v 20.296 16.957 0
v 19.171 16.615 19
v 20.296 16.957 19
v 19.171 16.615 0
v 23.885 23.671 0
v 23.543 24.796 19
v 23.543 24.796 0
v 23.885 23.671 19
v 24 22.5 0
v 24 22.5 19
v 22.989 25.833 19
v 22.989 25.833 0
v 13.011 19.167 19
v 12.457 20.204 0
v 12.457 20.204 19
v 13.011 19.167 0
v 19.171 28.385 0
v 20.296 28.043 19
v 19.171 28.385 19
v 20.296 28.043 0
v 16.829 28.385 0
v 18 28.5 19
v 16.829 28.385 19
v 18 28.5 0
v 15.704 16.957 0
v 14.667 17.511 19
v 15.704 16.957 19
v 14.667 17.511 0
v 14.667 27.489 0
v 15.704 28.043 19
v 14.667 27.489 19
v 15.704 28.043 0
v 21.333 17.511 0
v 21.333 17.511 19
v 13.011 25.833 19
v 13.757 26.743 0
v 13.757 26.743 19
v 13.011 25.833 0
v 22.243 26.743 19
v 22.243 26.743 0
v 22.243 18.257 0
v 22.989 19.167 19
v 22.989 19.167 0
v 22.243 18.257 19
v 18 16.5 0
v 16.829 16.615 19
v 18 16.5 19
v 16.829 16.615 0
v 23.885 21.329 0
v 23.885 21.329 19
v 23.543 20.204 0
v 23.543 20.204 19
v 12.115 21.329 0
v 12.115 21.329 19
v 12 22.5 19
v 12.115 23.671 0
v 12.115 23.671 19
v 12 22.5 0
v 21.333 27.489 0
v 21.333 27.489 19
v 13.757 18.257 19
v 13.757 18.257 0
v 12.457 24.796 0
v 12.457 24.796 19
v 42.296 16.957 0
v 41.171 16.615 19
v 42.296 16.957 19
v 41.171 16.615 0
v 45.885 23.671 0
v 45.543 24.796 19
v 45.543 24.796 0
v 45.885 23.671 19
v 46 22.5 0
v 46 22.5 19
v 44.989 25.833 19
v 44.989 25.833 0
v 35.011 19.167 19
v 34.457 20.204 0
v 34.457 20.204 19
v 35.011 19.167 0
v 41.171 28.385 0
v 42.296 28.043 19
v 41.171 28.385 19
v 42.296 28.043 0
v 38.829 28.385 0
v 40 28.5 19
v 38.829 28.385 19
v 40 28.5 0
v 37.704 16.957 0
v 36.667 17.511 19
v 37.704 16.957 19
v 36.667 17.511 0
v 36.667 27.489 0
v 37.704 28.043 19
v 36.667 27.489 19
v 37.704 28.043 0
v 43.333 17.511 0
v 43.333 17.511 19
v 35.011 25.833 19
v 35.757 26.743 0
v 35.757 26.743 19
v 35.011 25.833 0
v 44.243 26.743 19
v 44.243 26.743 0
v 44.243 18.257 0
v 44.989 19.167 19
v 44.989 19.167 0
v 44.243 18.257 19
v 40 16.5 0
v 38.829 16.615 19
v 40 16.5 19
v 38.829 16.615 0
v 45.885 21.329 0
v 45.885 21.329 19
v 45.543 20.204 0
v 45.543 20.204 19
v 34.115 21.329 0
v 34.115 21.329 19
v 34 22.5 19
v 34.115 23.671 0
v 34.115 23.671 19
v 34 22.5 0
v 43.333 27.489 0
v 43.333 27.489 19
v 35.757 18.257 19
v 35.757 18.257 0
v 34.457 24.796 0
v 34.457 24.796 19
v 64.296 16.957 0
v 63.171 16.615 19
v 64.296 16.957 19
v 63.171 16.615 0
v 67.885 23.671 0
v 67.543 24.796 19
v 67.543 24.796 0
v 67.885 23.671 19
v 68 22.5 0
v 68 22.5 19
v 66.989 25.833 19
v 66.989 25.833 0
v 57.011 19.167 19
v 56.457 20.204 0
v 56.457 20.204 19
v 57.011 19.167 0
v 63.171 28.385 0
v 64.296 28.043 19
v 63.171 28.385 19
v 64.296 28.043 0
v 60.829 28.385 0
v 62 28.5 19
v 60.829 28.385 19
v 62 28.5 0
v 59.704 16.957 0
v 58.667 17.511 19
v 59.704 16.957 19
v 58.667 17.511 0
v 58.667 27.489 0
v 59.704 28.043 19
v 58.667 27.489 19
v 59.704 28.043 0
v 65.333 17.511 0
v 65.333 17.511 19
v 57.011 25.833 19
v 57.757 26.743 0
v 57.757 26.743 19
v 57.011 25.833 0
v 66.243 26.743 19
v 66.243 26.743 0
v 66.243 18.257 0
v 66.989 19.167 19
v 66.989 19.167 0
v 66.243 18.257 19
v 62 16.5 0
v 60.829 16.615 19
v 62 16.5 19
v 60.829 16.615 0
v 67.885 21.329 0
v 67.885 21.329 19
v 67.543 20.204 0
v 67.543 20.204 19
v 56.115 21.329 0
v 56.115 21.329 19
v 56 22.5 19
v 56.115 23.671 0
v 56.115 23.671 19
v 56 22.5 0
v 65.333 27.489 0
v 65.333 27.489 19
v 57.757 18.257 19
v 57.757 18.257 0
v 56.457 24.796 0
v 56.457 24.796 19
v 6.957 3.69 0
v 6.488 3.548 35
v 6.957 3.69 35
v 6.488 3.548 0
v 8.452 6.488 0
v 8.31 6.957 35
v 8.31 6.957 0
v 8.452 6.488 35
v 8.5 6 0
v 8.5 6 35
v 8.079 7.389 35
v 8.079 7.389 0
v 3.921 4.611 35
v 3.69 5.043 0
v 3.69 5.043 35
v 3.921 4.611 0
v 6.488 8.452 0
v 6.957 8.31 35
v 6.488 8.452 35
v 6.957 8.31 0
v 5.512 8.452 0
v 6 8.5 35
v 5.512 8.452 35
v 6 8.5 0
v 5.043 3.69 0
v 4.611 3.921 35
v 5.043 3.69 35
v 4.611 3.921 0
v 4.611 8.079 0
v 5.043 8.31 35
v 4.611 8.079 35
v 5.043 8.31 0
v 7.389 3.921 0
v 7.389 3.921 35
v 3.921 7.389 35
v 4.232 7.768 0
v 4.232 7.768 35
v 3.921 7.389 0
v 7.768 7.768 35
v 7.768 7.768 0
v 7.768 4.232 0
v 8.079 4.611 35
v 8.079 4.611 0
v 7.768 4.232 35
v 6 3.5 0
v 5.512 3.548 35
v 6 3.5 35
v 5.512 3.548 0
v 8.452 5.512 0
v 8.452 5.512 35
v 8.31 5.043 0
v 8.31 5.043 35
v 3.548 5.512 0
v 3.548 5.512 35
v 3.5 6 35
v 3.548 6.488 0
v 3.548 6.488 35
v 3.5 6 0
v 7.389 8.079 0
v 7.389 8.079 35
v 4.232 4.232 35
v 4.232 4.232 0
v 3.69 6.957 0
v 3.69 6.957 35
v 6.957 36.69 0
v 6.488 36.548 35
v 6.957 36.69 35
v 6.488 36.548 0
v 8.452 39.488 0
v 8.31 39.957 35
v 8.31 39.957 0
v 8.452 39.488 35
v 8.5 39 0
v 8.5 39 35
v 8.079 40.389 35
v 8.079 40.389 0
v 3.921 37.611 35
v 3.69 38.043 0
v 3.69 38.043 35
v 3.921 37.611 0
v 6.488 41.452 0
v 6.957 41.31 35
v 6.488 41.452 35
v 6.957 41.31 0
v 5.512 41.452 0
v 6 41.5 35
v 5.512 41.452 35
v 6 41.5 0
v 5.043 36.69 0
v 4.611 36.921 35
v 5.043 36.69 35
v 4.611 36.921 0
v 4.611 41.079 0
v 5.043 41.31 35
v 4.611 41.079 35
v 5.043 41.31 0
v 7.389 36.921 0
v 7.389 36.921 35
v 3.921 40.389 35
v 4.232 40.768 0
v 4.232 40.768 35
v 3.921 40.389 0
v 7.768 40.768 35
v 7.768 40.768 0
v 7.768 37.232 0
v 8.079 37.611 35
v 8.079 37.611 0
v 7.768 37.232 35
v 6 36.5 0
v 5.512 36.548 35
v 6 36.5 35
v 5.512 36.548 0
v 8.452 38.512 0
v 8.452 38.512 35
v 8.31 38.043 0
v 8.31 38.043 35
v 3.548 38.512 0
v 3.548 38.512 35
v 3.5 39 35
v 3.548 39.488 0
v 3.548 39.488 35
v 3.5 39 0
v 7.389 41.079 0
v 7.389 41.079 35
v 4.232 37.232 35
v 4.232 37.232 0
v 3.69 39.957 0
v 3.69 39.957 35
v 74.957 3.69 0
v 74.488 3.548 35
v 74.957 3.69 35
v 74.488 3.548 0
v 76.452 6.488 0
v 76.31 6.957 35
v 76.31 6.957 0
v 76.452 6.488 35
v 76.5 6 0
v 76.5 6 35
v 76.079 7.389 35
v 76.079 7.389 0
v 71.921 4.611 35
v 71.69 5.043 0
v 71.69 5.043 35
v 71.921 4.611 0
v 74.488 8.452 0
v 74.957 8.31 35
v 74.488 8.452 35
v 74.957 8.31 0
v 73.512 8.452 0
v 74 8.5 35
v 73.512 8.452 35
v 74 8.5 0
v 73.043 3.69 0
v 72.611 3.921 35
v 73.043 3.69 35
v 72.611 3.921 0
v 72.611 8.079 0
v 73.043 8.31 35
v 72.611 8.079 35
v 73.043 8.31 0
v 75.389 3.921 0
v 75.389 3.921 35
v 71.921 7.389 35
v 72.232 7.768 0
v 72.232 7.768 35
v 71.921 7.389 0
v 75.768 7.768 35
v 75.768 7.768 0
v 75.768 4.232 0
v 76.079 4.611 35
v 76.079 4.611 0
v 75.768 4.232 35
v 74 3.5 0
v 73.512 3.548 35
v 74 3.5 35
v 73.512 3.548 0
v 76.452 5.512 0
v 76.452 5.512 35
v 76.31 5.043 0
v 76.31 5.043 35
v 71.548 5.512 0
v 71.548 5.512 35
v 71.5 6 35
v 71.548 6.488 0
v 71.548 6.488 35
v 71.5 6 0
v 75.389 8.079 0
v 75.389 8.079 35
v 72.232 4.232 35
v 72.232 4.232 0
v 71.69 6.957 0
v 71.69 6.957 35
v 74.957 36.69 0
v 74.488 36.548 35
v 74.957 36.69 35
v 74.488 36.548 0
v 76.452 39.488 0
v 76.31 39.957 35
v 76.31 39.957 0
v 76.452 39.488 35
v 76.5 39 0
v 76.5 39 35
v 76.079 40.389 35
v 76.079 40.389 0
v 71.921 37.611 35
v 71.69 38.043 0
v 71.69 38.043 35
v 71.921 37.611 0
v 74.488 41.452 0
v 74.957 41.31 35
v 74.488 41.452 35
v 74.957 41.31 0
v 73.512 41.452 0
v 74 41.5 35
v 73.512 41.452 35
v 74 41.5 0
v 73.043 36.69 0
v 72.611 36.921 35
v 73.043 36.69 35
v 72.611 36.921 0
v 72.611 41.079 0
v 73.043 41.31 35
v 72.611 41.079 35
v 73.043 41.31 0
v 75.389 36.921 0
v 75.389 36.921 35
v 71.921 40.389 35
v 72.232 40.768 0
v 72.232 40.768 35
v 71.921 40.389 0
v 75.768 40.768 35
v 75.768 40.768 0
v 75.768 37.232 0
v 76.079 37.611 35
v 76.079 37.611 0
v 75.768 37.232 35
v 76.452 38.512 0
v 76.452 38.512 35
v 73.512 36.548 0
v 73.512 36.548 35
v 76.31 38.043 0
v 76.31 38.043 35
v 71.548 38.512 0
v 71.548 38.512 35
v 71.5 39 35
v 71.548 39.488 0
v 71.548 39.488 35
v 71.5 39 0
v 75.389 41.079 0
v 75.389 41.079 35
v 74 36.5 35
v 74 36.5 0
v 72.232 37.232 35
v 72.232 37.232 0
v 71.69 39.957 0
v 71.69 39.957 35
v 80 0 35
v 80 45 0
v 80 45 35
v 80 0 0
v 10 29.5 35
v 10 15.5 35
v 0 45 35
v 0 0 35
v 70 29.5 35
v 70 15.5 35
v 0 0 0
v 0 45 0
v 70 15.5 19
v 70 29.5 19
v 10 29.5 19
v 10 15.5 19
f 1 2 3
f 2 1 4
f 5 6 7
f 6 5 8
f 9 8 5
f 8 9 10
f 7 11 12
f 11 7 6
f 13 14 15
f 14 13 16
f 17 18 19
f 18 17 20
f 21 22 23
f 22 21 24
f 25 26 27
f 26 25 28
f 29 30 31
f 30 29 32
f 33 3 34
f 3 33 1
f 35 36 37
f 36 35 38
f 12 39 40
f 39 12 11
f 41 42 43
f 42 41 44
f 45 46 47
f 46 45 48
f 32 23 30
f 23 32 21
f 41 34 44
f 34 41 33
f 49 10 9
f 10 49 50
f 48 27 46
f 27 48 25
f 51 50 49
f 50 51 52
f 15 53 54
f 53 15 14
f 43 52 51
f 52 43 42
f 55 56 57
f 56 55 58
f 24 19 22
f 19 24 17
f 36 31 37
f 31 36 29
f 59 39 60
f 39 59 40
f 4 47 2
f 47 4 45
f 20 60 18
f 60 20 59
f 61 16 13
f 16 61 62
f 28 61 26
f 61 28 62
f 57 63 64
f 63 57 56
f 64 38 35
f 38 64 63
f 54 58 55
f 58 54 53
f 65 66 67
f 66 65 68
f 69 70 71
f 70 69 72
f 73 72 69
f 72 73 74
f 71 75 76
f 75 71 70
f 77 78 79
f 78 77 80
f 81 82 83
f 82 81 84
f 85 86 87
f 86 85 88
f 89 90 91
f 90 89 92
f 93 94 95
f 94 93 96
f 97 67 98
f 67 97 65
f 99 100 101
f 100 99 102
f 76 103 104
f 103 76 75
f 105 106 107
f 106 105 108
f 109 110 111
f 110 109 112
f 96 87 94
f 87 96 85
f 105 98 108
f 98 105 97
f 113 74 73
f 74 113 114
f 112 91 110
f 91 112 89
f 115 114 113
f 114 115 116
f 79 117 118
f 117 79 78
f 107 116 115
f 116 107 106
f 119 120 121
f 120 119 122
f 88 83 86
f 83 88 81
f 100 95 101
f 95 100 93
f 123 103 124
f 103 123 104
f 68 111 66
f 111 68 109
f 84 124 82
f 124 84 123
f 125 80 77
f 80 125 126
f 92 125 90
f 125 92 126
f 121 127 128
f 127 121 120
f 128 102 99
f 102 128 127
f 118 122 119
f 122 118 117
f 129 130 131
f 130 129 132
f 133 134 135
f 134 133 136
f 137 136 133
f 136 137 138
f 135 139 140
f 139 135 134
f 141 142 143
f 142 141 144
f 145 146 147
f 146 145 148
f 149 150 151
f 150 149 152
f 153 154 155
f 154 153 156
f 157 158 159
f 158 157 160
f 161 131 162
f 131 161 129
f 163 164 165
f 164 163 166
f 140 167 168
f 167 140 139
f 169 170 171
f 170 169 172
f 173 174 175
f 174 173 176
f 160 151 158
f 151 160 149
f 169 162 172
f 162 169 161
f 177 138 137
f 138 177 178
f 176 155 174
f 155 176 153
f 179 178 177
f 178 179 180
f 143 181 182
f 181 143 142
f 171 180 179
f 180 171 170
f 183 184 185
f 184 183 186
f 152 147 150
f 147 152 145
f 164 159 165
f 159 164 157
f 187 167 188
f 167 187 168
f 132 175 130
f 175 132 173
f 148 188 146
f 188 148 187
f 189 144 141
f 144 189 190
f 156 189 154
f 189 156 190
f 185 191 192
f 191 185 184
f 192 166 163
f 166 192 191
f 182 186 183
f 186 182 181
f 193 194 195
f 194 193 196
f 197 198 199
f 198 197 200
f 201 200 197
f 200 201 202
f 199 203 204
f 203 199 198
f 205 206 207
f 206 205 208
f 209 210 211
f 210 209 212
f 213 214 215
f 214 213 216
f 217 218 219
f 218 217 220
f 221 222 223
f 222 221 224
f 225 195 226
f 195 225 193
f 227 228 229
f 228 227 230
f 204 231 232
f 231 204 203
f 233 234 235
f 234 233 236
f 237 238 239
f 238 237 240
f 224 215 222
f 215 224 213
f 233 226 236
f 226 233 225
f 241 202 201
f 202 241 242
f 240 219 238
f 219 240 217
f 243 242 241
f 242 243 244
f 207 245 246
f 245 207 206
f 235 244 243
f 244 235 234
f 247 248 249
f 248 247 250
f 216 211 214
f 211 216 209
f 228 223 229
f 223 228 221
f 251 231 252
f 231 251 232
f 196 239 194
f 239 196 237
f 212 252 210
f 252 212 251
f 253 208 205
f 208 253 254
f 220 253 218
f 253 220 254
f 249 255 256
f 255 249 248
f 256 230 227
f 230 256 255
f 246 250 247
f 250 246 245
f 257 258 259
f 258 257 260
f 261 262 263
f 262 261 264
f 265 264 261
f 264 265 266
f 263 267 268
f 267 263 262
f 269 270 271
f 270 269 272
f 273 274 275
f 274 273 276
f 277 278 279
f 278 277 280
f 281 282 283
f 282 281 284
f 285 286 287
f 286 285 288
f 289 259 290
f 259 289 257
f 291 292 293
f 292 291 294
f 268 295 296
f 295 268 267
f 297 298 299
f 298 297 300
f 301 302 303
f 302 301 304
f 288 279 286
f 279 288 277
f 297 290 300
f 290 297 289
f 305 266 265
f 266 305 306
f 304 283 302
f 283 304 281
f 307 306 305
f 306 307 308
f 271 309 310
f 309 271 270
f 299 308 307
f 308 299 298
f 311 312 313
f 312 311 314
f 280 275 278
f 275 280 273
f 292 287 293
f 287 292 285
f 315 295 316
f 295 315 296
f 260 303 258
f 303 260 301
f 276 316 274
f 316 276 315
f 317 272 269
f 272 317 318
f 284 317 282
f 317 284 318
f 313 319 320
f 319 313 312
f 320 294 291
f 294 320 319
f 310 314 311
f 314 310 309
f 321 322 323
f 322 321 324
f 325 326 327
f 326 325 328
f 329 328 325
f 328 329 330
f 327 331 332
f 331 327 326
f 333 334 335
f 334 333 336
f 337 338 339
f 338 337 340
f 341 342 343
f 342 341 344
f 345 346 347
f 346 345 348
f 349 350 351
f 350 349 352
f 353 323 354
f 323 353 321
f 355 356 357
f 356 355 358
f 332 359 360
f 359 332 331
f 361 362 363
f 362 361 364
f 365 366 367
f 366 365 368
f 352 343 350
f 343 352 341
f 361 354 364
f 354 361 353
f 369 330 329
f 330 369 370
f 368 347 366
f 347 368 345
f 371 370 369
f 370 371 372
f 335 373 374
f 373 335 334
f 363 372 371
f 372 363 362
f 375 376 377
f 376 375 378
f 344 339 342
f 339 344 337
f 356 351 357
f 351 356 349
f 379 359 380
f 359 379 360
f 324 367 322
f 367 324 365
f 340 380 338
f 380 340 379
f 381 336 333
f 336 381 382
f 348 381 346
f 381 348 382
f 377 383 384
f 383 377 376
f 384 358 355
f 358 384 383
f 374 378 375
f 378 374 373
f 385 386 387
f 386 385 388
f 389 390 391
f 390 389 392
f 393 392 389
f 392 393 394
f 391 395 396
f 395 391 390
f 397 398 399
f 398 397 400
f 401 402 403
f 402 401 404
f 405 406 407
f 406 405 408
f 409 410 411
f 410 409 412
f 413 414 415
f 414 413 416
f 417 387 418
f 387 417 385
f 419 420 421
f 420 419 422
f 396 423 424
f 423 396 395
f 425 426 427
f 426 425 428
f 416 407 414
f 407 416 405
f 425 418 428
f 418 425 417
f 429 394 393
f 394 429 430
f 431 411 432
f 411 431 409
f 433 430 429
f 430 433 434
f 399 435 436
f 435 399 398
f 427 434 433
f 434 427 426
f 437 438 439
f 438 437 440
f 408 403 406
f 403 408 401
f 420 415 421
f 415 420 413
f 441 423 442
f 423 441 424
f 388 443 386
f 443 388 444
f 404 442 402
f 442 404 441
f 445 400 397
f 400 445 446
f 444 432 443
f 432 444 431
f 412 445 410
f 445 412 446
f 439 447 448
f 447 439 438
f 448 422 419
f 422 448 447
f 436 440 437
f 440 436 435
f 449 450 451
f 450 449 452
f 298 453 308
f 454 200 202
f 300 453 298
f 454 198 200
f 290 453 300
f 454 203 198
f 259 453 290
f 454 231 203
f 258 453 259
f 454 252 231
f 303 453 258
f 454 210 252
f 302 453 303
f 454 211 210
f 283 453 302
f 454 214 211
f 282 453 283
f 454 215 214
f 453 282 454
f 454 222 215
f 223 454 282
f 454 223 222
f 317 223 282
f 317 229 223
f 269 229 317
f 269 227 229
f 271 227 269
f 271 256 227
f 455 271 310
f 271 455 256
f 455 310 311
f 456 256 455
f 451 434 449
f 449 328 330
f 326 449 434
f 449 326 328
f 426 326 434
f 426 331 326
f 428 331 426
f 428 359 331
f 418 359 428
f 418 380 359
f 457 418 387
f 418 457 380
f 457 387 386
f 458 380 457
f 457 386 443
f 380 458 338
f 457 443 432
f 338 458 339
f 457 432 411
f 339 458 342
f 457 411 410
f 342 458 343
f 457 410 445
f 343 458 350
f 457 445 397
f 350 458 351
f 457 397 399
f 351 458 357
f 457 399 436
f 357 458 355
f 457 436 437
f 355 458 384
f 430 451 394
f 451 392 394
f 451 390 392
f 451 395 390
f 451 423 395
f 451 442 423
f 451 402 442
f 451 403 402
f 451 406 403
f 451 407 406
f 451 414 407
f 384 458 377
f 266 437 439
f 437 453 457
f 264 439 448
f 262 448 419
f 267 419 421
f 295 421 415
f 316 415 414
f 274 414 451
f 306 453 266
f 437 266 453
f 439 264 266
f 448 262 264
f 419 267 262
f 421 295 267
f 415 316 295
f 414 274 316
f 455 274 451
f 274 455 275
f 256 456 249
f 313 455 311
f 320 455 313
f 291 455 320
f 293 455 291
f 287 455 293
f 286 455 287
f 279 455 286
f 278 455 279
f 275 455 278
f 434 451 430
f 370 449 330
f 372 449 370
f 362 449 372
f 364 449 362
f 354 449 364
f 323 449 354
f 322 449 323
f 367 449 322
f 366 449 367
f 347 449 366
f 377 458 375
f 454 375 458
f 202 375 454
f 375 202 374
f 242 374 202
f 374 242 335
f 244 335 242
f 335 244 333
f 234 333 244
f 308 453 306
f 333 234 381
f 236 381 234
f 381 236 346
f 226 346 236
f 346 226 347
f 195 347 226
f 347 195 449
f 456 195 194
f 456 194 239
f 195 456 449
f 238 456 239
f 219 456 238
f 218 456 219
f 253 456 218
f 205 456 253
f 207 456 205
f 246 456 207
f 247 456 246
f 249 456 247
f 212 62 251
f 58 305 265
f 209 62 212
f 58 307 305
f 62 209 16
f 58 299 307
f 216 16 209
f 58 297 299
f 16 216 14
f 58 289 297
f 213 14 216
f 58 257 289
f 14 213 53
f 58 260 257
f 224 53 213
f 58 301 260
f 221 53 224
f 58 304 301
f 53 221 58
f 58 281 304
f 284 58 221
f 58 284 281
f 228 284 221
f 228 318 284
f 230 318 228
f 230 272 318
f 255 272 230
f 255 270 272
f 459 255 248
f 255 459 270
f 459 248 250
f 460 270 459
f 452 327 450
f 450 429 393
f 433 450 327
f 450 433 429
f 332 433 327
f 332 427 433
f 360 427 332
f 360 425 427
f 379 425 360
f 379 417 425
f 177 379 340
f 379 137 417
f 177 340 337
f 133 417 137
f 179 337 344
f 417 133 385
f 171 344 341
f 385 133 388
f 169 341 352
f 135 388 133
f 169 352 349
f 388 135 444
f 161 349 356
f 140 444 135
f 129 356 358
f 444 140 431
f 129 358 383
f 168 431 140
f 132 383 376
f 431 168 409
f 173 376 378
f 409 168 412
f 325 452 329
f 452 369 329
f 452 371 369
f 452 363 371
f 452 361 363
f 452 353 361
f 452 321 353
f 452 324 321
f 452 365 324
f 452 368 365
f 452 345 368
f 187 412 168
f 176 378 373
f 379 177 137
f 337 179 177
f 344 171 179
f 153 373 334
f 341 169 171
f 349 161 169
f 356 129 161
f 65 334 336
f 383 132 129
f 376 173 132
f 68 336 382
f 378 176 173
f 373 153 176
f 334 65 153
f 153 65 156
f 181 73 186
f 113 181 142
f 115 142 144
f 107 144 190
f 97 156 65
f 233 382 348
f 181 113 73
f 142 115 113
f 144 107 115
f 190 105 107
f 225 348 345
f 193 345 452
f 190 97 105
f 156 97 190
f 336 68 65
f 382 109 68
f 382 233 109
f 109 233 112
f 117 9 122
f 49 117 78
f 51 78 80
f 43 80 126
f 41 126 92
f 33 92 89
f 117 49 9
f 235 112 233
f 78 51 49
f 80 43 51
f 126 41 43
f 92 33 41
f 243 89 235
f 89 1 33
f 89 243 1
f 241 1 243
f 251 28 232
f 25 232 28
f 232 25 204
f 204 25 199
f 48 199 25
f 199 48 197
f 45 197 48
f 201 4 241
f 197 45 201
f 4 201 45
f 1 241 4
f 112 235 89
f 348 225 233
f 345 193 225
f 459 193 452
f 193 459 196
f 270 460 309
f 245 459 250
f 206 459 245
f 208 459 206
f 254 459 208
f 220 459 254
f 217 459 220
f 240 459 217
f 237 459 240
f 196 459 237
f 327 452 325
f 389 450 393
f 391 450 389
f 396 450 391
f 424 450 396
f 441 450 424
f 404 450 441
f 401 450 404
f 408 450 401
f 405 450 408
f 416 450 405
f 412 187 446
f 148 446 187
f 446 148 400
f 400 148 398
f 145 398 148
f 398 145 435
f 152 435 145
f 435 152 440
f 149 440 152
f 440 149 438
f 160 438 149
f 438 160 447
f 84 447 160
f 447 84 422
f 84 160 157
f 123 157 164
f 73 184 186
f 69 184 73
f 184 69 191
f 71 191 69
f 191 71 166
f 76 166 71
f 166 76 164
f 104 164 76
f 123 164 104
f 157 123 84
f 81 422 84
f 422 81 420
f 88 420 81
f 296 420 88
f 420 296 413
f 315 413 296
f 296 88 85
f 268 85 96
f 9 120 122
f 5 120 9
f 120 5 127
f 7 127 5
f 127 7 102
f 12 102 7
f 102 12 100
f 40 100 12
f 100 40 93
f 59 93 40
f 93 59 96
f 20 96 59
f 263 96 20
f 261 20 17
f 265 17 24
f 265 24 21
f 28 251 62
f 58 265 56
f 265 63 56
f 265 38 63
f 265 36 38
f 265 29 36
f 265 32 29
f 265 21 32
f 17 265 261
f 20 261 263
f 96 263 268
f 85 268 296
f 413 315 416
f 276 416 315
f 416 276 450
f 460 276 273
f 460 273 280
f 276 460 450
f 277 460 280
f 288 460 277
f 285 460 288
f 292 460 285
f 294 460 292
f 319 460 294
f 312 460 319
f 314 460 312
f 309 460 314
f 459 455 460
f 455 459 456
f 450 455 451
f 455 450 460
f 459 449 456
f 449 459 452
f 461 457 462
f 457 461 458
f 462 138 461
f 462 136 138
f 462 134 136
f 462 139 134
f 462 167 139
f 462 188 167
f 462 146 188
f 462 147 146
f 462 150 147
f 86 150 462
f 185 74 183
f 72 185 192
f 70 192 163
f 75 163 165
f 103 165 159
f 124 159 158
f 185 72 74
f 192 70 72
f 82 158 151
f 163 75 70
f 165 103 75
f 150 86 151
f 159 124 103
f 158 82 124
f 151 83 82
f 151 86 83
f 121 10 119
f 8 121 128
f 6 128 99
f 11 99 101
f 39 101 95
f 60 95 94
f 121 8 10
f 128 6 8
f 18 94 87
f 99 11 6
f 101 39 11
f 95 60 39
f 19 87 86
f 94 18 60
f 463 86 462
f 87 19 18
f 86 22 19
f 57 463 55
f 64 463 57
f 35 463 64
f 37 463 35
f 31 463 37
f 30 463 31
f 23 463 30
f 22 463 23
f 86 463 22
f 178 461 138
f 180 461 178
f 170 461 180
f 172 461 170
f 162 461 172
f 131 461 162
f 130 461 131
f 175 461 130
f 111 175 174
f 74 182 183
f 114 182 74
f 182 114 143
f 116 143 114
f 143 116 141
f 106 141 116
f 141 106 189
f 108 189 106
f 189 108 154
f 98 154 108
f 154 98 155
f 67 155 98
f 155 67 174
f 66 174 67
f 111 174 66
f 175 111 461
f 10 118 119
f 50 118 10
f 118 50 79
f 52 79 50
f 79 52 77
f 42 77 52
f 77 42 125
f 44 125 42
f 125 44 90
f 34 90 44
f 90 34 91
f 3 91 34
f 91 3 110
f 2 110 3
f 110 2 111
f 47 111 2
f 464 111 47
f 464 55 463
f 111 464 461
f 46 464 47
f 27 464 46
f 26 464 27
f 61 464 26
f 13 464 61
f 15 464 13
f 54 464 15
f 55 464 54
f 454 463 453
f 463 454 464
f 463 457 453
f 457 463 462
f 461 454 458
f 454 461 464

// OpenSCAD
$fn = 32;

// ----------------------------------------------------------------------
// Manifold block: gallery_top manifold
// ----------------------------------------------------------------------

// --- parameters (mm) ---
block_l = 80;             // block length, X
block_w = 45;             // block width, Y
block_h = 35;             // block height, Z
port_d = 12;              // port bore diameter
port_pitch = 22;          // port pitch along X
gallery_d = 14;           // top gallery width, Y
gallery_depth = 16;       // gallery pocket depth
wall_p = 10;              // gallery end wall thickness, X
mnt_d = 5;                // mounting hole diameter
mnt_in = 6;               // mounting hole inset from the edges

n_ports = 3;  // ports in the row
port_x0 = (block_l - (n_ports - 1) * port_pitch) / 2;  // first port X

difference() {
  cube([block_l, block_w, block_h]);
  for (i = [0 : n_ports - 1])
    translate([port_x0 + i * port_pitch, block_w / 2, -1])
      cylinder(h = block_h + 2, d = port_d);
  translate([wall_p, block_w / 2 - gallery_d / 2, block_h - gallery_depth])
    cube([block_l - 2 * wall_p, gallery_d, gallery_depth + 1]);
  for (cx = [mnt_in, block_l - mnt_in])
    for (cy = [mnt_in, block_w - mnt_in])
      translate([cx, cy, -1]) cylinder(h = block_h + 2, d = mnt_d);
}
